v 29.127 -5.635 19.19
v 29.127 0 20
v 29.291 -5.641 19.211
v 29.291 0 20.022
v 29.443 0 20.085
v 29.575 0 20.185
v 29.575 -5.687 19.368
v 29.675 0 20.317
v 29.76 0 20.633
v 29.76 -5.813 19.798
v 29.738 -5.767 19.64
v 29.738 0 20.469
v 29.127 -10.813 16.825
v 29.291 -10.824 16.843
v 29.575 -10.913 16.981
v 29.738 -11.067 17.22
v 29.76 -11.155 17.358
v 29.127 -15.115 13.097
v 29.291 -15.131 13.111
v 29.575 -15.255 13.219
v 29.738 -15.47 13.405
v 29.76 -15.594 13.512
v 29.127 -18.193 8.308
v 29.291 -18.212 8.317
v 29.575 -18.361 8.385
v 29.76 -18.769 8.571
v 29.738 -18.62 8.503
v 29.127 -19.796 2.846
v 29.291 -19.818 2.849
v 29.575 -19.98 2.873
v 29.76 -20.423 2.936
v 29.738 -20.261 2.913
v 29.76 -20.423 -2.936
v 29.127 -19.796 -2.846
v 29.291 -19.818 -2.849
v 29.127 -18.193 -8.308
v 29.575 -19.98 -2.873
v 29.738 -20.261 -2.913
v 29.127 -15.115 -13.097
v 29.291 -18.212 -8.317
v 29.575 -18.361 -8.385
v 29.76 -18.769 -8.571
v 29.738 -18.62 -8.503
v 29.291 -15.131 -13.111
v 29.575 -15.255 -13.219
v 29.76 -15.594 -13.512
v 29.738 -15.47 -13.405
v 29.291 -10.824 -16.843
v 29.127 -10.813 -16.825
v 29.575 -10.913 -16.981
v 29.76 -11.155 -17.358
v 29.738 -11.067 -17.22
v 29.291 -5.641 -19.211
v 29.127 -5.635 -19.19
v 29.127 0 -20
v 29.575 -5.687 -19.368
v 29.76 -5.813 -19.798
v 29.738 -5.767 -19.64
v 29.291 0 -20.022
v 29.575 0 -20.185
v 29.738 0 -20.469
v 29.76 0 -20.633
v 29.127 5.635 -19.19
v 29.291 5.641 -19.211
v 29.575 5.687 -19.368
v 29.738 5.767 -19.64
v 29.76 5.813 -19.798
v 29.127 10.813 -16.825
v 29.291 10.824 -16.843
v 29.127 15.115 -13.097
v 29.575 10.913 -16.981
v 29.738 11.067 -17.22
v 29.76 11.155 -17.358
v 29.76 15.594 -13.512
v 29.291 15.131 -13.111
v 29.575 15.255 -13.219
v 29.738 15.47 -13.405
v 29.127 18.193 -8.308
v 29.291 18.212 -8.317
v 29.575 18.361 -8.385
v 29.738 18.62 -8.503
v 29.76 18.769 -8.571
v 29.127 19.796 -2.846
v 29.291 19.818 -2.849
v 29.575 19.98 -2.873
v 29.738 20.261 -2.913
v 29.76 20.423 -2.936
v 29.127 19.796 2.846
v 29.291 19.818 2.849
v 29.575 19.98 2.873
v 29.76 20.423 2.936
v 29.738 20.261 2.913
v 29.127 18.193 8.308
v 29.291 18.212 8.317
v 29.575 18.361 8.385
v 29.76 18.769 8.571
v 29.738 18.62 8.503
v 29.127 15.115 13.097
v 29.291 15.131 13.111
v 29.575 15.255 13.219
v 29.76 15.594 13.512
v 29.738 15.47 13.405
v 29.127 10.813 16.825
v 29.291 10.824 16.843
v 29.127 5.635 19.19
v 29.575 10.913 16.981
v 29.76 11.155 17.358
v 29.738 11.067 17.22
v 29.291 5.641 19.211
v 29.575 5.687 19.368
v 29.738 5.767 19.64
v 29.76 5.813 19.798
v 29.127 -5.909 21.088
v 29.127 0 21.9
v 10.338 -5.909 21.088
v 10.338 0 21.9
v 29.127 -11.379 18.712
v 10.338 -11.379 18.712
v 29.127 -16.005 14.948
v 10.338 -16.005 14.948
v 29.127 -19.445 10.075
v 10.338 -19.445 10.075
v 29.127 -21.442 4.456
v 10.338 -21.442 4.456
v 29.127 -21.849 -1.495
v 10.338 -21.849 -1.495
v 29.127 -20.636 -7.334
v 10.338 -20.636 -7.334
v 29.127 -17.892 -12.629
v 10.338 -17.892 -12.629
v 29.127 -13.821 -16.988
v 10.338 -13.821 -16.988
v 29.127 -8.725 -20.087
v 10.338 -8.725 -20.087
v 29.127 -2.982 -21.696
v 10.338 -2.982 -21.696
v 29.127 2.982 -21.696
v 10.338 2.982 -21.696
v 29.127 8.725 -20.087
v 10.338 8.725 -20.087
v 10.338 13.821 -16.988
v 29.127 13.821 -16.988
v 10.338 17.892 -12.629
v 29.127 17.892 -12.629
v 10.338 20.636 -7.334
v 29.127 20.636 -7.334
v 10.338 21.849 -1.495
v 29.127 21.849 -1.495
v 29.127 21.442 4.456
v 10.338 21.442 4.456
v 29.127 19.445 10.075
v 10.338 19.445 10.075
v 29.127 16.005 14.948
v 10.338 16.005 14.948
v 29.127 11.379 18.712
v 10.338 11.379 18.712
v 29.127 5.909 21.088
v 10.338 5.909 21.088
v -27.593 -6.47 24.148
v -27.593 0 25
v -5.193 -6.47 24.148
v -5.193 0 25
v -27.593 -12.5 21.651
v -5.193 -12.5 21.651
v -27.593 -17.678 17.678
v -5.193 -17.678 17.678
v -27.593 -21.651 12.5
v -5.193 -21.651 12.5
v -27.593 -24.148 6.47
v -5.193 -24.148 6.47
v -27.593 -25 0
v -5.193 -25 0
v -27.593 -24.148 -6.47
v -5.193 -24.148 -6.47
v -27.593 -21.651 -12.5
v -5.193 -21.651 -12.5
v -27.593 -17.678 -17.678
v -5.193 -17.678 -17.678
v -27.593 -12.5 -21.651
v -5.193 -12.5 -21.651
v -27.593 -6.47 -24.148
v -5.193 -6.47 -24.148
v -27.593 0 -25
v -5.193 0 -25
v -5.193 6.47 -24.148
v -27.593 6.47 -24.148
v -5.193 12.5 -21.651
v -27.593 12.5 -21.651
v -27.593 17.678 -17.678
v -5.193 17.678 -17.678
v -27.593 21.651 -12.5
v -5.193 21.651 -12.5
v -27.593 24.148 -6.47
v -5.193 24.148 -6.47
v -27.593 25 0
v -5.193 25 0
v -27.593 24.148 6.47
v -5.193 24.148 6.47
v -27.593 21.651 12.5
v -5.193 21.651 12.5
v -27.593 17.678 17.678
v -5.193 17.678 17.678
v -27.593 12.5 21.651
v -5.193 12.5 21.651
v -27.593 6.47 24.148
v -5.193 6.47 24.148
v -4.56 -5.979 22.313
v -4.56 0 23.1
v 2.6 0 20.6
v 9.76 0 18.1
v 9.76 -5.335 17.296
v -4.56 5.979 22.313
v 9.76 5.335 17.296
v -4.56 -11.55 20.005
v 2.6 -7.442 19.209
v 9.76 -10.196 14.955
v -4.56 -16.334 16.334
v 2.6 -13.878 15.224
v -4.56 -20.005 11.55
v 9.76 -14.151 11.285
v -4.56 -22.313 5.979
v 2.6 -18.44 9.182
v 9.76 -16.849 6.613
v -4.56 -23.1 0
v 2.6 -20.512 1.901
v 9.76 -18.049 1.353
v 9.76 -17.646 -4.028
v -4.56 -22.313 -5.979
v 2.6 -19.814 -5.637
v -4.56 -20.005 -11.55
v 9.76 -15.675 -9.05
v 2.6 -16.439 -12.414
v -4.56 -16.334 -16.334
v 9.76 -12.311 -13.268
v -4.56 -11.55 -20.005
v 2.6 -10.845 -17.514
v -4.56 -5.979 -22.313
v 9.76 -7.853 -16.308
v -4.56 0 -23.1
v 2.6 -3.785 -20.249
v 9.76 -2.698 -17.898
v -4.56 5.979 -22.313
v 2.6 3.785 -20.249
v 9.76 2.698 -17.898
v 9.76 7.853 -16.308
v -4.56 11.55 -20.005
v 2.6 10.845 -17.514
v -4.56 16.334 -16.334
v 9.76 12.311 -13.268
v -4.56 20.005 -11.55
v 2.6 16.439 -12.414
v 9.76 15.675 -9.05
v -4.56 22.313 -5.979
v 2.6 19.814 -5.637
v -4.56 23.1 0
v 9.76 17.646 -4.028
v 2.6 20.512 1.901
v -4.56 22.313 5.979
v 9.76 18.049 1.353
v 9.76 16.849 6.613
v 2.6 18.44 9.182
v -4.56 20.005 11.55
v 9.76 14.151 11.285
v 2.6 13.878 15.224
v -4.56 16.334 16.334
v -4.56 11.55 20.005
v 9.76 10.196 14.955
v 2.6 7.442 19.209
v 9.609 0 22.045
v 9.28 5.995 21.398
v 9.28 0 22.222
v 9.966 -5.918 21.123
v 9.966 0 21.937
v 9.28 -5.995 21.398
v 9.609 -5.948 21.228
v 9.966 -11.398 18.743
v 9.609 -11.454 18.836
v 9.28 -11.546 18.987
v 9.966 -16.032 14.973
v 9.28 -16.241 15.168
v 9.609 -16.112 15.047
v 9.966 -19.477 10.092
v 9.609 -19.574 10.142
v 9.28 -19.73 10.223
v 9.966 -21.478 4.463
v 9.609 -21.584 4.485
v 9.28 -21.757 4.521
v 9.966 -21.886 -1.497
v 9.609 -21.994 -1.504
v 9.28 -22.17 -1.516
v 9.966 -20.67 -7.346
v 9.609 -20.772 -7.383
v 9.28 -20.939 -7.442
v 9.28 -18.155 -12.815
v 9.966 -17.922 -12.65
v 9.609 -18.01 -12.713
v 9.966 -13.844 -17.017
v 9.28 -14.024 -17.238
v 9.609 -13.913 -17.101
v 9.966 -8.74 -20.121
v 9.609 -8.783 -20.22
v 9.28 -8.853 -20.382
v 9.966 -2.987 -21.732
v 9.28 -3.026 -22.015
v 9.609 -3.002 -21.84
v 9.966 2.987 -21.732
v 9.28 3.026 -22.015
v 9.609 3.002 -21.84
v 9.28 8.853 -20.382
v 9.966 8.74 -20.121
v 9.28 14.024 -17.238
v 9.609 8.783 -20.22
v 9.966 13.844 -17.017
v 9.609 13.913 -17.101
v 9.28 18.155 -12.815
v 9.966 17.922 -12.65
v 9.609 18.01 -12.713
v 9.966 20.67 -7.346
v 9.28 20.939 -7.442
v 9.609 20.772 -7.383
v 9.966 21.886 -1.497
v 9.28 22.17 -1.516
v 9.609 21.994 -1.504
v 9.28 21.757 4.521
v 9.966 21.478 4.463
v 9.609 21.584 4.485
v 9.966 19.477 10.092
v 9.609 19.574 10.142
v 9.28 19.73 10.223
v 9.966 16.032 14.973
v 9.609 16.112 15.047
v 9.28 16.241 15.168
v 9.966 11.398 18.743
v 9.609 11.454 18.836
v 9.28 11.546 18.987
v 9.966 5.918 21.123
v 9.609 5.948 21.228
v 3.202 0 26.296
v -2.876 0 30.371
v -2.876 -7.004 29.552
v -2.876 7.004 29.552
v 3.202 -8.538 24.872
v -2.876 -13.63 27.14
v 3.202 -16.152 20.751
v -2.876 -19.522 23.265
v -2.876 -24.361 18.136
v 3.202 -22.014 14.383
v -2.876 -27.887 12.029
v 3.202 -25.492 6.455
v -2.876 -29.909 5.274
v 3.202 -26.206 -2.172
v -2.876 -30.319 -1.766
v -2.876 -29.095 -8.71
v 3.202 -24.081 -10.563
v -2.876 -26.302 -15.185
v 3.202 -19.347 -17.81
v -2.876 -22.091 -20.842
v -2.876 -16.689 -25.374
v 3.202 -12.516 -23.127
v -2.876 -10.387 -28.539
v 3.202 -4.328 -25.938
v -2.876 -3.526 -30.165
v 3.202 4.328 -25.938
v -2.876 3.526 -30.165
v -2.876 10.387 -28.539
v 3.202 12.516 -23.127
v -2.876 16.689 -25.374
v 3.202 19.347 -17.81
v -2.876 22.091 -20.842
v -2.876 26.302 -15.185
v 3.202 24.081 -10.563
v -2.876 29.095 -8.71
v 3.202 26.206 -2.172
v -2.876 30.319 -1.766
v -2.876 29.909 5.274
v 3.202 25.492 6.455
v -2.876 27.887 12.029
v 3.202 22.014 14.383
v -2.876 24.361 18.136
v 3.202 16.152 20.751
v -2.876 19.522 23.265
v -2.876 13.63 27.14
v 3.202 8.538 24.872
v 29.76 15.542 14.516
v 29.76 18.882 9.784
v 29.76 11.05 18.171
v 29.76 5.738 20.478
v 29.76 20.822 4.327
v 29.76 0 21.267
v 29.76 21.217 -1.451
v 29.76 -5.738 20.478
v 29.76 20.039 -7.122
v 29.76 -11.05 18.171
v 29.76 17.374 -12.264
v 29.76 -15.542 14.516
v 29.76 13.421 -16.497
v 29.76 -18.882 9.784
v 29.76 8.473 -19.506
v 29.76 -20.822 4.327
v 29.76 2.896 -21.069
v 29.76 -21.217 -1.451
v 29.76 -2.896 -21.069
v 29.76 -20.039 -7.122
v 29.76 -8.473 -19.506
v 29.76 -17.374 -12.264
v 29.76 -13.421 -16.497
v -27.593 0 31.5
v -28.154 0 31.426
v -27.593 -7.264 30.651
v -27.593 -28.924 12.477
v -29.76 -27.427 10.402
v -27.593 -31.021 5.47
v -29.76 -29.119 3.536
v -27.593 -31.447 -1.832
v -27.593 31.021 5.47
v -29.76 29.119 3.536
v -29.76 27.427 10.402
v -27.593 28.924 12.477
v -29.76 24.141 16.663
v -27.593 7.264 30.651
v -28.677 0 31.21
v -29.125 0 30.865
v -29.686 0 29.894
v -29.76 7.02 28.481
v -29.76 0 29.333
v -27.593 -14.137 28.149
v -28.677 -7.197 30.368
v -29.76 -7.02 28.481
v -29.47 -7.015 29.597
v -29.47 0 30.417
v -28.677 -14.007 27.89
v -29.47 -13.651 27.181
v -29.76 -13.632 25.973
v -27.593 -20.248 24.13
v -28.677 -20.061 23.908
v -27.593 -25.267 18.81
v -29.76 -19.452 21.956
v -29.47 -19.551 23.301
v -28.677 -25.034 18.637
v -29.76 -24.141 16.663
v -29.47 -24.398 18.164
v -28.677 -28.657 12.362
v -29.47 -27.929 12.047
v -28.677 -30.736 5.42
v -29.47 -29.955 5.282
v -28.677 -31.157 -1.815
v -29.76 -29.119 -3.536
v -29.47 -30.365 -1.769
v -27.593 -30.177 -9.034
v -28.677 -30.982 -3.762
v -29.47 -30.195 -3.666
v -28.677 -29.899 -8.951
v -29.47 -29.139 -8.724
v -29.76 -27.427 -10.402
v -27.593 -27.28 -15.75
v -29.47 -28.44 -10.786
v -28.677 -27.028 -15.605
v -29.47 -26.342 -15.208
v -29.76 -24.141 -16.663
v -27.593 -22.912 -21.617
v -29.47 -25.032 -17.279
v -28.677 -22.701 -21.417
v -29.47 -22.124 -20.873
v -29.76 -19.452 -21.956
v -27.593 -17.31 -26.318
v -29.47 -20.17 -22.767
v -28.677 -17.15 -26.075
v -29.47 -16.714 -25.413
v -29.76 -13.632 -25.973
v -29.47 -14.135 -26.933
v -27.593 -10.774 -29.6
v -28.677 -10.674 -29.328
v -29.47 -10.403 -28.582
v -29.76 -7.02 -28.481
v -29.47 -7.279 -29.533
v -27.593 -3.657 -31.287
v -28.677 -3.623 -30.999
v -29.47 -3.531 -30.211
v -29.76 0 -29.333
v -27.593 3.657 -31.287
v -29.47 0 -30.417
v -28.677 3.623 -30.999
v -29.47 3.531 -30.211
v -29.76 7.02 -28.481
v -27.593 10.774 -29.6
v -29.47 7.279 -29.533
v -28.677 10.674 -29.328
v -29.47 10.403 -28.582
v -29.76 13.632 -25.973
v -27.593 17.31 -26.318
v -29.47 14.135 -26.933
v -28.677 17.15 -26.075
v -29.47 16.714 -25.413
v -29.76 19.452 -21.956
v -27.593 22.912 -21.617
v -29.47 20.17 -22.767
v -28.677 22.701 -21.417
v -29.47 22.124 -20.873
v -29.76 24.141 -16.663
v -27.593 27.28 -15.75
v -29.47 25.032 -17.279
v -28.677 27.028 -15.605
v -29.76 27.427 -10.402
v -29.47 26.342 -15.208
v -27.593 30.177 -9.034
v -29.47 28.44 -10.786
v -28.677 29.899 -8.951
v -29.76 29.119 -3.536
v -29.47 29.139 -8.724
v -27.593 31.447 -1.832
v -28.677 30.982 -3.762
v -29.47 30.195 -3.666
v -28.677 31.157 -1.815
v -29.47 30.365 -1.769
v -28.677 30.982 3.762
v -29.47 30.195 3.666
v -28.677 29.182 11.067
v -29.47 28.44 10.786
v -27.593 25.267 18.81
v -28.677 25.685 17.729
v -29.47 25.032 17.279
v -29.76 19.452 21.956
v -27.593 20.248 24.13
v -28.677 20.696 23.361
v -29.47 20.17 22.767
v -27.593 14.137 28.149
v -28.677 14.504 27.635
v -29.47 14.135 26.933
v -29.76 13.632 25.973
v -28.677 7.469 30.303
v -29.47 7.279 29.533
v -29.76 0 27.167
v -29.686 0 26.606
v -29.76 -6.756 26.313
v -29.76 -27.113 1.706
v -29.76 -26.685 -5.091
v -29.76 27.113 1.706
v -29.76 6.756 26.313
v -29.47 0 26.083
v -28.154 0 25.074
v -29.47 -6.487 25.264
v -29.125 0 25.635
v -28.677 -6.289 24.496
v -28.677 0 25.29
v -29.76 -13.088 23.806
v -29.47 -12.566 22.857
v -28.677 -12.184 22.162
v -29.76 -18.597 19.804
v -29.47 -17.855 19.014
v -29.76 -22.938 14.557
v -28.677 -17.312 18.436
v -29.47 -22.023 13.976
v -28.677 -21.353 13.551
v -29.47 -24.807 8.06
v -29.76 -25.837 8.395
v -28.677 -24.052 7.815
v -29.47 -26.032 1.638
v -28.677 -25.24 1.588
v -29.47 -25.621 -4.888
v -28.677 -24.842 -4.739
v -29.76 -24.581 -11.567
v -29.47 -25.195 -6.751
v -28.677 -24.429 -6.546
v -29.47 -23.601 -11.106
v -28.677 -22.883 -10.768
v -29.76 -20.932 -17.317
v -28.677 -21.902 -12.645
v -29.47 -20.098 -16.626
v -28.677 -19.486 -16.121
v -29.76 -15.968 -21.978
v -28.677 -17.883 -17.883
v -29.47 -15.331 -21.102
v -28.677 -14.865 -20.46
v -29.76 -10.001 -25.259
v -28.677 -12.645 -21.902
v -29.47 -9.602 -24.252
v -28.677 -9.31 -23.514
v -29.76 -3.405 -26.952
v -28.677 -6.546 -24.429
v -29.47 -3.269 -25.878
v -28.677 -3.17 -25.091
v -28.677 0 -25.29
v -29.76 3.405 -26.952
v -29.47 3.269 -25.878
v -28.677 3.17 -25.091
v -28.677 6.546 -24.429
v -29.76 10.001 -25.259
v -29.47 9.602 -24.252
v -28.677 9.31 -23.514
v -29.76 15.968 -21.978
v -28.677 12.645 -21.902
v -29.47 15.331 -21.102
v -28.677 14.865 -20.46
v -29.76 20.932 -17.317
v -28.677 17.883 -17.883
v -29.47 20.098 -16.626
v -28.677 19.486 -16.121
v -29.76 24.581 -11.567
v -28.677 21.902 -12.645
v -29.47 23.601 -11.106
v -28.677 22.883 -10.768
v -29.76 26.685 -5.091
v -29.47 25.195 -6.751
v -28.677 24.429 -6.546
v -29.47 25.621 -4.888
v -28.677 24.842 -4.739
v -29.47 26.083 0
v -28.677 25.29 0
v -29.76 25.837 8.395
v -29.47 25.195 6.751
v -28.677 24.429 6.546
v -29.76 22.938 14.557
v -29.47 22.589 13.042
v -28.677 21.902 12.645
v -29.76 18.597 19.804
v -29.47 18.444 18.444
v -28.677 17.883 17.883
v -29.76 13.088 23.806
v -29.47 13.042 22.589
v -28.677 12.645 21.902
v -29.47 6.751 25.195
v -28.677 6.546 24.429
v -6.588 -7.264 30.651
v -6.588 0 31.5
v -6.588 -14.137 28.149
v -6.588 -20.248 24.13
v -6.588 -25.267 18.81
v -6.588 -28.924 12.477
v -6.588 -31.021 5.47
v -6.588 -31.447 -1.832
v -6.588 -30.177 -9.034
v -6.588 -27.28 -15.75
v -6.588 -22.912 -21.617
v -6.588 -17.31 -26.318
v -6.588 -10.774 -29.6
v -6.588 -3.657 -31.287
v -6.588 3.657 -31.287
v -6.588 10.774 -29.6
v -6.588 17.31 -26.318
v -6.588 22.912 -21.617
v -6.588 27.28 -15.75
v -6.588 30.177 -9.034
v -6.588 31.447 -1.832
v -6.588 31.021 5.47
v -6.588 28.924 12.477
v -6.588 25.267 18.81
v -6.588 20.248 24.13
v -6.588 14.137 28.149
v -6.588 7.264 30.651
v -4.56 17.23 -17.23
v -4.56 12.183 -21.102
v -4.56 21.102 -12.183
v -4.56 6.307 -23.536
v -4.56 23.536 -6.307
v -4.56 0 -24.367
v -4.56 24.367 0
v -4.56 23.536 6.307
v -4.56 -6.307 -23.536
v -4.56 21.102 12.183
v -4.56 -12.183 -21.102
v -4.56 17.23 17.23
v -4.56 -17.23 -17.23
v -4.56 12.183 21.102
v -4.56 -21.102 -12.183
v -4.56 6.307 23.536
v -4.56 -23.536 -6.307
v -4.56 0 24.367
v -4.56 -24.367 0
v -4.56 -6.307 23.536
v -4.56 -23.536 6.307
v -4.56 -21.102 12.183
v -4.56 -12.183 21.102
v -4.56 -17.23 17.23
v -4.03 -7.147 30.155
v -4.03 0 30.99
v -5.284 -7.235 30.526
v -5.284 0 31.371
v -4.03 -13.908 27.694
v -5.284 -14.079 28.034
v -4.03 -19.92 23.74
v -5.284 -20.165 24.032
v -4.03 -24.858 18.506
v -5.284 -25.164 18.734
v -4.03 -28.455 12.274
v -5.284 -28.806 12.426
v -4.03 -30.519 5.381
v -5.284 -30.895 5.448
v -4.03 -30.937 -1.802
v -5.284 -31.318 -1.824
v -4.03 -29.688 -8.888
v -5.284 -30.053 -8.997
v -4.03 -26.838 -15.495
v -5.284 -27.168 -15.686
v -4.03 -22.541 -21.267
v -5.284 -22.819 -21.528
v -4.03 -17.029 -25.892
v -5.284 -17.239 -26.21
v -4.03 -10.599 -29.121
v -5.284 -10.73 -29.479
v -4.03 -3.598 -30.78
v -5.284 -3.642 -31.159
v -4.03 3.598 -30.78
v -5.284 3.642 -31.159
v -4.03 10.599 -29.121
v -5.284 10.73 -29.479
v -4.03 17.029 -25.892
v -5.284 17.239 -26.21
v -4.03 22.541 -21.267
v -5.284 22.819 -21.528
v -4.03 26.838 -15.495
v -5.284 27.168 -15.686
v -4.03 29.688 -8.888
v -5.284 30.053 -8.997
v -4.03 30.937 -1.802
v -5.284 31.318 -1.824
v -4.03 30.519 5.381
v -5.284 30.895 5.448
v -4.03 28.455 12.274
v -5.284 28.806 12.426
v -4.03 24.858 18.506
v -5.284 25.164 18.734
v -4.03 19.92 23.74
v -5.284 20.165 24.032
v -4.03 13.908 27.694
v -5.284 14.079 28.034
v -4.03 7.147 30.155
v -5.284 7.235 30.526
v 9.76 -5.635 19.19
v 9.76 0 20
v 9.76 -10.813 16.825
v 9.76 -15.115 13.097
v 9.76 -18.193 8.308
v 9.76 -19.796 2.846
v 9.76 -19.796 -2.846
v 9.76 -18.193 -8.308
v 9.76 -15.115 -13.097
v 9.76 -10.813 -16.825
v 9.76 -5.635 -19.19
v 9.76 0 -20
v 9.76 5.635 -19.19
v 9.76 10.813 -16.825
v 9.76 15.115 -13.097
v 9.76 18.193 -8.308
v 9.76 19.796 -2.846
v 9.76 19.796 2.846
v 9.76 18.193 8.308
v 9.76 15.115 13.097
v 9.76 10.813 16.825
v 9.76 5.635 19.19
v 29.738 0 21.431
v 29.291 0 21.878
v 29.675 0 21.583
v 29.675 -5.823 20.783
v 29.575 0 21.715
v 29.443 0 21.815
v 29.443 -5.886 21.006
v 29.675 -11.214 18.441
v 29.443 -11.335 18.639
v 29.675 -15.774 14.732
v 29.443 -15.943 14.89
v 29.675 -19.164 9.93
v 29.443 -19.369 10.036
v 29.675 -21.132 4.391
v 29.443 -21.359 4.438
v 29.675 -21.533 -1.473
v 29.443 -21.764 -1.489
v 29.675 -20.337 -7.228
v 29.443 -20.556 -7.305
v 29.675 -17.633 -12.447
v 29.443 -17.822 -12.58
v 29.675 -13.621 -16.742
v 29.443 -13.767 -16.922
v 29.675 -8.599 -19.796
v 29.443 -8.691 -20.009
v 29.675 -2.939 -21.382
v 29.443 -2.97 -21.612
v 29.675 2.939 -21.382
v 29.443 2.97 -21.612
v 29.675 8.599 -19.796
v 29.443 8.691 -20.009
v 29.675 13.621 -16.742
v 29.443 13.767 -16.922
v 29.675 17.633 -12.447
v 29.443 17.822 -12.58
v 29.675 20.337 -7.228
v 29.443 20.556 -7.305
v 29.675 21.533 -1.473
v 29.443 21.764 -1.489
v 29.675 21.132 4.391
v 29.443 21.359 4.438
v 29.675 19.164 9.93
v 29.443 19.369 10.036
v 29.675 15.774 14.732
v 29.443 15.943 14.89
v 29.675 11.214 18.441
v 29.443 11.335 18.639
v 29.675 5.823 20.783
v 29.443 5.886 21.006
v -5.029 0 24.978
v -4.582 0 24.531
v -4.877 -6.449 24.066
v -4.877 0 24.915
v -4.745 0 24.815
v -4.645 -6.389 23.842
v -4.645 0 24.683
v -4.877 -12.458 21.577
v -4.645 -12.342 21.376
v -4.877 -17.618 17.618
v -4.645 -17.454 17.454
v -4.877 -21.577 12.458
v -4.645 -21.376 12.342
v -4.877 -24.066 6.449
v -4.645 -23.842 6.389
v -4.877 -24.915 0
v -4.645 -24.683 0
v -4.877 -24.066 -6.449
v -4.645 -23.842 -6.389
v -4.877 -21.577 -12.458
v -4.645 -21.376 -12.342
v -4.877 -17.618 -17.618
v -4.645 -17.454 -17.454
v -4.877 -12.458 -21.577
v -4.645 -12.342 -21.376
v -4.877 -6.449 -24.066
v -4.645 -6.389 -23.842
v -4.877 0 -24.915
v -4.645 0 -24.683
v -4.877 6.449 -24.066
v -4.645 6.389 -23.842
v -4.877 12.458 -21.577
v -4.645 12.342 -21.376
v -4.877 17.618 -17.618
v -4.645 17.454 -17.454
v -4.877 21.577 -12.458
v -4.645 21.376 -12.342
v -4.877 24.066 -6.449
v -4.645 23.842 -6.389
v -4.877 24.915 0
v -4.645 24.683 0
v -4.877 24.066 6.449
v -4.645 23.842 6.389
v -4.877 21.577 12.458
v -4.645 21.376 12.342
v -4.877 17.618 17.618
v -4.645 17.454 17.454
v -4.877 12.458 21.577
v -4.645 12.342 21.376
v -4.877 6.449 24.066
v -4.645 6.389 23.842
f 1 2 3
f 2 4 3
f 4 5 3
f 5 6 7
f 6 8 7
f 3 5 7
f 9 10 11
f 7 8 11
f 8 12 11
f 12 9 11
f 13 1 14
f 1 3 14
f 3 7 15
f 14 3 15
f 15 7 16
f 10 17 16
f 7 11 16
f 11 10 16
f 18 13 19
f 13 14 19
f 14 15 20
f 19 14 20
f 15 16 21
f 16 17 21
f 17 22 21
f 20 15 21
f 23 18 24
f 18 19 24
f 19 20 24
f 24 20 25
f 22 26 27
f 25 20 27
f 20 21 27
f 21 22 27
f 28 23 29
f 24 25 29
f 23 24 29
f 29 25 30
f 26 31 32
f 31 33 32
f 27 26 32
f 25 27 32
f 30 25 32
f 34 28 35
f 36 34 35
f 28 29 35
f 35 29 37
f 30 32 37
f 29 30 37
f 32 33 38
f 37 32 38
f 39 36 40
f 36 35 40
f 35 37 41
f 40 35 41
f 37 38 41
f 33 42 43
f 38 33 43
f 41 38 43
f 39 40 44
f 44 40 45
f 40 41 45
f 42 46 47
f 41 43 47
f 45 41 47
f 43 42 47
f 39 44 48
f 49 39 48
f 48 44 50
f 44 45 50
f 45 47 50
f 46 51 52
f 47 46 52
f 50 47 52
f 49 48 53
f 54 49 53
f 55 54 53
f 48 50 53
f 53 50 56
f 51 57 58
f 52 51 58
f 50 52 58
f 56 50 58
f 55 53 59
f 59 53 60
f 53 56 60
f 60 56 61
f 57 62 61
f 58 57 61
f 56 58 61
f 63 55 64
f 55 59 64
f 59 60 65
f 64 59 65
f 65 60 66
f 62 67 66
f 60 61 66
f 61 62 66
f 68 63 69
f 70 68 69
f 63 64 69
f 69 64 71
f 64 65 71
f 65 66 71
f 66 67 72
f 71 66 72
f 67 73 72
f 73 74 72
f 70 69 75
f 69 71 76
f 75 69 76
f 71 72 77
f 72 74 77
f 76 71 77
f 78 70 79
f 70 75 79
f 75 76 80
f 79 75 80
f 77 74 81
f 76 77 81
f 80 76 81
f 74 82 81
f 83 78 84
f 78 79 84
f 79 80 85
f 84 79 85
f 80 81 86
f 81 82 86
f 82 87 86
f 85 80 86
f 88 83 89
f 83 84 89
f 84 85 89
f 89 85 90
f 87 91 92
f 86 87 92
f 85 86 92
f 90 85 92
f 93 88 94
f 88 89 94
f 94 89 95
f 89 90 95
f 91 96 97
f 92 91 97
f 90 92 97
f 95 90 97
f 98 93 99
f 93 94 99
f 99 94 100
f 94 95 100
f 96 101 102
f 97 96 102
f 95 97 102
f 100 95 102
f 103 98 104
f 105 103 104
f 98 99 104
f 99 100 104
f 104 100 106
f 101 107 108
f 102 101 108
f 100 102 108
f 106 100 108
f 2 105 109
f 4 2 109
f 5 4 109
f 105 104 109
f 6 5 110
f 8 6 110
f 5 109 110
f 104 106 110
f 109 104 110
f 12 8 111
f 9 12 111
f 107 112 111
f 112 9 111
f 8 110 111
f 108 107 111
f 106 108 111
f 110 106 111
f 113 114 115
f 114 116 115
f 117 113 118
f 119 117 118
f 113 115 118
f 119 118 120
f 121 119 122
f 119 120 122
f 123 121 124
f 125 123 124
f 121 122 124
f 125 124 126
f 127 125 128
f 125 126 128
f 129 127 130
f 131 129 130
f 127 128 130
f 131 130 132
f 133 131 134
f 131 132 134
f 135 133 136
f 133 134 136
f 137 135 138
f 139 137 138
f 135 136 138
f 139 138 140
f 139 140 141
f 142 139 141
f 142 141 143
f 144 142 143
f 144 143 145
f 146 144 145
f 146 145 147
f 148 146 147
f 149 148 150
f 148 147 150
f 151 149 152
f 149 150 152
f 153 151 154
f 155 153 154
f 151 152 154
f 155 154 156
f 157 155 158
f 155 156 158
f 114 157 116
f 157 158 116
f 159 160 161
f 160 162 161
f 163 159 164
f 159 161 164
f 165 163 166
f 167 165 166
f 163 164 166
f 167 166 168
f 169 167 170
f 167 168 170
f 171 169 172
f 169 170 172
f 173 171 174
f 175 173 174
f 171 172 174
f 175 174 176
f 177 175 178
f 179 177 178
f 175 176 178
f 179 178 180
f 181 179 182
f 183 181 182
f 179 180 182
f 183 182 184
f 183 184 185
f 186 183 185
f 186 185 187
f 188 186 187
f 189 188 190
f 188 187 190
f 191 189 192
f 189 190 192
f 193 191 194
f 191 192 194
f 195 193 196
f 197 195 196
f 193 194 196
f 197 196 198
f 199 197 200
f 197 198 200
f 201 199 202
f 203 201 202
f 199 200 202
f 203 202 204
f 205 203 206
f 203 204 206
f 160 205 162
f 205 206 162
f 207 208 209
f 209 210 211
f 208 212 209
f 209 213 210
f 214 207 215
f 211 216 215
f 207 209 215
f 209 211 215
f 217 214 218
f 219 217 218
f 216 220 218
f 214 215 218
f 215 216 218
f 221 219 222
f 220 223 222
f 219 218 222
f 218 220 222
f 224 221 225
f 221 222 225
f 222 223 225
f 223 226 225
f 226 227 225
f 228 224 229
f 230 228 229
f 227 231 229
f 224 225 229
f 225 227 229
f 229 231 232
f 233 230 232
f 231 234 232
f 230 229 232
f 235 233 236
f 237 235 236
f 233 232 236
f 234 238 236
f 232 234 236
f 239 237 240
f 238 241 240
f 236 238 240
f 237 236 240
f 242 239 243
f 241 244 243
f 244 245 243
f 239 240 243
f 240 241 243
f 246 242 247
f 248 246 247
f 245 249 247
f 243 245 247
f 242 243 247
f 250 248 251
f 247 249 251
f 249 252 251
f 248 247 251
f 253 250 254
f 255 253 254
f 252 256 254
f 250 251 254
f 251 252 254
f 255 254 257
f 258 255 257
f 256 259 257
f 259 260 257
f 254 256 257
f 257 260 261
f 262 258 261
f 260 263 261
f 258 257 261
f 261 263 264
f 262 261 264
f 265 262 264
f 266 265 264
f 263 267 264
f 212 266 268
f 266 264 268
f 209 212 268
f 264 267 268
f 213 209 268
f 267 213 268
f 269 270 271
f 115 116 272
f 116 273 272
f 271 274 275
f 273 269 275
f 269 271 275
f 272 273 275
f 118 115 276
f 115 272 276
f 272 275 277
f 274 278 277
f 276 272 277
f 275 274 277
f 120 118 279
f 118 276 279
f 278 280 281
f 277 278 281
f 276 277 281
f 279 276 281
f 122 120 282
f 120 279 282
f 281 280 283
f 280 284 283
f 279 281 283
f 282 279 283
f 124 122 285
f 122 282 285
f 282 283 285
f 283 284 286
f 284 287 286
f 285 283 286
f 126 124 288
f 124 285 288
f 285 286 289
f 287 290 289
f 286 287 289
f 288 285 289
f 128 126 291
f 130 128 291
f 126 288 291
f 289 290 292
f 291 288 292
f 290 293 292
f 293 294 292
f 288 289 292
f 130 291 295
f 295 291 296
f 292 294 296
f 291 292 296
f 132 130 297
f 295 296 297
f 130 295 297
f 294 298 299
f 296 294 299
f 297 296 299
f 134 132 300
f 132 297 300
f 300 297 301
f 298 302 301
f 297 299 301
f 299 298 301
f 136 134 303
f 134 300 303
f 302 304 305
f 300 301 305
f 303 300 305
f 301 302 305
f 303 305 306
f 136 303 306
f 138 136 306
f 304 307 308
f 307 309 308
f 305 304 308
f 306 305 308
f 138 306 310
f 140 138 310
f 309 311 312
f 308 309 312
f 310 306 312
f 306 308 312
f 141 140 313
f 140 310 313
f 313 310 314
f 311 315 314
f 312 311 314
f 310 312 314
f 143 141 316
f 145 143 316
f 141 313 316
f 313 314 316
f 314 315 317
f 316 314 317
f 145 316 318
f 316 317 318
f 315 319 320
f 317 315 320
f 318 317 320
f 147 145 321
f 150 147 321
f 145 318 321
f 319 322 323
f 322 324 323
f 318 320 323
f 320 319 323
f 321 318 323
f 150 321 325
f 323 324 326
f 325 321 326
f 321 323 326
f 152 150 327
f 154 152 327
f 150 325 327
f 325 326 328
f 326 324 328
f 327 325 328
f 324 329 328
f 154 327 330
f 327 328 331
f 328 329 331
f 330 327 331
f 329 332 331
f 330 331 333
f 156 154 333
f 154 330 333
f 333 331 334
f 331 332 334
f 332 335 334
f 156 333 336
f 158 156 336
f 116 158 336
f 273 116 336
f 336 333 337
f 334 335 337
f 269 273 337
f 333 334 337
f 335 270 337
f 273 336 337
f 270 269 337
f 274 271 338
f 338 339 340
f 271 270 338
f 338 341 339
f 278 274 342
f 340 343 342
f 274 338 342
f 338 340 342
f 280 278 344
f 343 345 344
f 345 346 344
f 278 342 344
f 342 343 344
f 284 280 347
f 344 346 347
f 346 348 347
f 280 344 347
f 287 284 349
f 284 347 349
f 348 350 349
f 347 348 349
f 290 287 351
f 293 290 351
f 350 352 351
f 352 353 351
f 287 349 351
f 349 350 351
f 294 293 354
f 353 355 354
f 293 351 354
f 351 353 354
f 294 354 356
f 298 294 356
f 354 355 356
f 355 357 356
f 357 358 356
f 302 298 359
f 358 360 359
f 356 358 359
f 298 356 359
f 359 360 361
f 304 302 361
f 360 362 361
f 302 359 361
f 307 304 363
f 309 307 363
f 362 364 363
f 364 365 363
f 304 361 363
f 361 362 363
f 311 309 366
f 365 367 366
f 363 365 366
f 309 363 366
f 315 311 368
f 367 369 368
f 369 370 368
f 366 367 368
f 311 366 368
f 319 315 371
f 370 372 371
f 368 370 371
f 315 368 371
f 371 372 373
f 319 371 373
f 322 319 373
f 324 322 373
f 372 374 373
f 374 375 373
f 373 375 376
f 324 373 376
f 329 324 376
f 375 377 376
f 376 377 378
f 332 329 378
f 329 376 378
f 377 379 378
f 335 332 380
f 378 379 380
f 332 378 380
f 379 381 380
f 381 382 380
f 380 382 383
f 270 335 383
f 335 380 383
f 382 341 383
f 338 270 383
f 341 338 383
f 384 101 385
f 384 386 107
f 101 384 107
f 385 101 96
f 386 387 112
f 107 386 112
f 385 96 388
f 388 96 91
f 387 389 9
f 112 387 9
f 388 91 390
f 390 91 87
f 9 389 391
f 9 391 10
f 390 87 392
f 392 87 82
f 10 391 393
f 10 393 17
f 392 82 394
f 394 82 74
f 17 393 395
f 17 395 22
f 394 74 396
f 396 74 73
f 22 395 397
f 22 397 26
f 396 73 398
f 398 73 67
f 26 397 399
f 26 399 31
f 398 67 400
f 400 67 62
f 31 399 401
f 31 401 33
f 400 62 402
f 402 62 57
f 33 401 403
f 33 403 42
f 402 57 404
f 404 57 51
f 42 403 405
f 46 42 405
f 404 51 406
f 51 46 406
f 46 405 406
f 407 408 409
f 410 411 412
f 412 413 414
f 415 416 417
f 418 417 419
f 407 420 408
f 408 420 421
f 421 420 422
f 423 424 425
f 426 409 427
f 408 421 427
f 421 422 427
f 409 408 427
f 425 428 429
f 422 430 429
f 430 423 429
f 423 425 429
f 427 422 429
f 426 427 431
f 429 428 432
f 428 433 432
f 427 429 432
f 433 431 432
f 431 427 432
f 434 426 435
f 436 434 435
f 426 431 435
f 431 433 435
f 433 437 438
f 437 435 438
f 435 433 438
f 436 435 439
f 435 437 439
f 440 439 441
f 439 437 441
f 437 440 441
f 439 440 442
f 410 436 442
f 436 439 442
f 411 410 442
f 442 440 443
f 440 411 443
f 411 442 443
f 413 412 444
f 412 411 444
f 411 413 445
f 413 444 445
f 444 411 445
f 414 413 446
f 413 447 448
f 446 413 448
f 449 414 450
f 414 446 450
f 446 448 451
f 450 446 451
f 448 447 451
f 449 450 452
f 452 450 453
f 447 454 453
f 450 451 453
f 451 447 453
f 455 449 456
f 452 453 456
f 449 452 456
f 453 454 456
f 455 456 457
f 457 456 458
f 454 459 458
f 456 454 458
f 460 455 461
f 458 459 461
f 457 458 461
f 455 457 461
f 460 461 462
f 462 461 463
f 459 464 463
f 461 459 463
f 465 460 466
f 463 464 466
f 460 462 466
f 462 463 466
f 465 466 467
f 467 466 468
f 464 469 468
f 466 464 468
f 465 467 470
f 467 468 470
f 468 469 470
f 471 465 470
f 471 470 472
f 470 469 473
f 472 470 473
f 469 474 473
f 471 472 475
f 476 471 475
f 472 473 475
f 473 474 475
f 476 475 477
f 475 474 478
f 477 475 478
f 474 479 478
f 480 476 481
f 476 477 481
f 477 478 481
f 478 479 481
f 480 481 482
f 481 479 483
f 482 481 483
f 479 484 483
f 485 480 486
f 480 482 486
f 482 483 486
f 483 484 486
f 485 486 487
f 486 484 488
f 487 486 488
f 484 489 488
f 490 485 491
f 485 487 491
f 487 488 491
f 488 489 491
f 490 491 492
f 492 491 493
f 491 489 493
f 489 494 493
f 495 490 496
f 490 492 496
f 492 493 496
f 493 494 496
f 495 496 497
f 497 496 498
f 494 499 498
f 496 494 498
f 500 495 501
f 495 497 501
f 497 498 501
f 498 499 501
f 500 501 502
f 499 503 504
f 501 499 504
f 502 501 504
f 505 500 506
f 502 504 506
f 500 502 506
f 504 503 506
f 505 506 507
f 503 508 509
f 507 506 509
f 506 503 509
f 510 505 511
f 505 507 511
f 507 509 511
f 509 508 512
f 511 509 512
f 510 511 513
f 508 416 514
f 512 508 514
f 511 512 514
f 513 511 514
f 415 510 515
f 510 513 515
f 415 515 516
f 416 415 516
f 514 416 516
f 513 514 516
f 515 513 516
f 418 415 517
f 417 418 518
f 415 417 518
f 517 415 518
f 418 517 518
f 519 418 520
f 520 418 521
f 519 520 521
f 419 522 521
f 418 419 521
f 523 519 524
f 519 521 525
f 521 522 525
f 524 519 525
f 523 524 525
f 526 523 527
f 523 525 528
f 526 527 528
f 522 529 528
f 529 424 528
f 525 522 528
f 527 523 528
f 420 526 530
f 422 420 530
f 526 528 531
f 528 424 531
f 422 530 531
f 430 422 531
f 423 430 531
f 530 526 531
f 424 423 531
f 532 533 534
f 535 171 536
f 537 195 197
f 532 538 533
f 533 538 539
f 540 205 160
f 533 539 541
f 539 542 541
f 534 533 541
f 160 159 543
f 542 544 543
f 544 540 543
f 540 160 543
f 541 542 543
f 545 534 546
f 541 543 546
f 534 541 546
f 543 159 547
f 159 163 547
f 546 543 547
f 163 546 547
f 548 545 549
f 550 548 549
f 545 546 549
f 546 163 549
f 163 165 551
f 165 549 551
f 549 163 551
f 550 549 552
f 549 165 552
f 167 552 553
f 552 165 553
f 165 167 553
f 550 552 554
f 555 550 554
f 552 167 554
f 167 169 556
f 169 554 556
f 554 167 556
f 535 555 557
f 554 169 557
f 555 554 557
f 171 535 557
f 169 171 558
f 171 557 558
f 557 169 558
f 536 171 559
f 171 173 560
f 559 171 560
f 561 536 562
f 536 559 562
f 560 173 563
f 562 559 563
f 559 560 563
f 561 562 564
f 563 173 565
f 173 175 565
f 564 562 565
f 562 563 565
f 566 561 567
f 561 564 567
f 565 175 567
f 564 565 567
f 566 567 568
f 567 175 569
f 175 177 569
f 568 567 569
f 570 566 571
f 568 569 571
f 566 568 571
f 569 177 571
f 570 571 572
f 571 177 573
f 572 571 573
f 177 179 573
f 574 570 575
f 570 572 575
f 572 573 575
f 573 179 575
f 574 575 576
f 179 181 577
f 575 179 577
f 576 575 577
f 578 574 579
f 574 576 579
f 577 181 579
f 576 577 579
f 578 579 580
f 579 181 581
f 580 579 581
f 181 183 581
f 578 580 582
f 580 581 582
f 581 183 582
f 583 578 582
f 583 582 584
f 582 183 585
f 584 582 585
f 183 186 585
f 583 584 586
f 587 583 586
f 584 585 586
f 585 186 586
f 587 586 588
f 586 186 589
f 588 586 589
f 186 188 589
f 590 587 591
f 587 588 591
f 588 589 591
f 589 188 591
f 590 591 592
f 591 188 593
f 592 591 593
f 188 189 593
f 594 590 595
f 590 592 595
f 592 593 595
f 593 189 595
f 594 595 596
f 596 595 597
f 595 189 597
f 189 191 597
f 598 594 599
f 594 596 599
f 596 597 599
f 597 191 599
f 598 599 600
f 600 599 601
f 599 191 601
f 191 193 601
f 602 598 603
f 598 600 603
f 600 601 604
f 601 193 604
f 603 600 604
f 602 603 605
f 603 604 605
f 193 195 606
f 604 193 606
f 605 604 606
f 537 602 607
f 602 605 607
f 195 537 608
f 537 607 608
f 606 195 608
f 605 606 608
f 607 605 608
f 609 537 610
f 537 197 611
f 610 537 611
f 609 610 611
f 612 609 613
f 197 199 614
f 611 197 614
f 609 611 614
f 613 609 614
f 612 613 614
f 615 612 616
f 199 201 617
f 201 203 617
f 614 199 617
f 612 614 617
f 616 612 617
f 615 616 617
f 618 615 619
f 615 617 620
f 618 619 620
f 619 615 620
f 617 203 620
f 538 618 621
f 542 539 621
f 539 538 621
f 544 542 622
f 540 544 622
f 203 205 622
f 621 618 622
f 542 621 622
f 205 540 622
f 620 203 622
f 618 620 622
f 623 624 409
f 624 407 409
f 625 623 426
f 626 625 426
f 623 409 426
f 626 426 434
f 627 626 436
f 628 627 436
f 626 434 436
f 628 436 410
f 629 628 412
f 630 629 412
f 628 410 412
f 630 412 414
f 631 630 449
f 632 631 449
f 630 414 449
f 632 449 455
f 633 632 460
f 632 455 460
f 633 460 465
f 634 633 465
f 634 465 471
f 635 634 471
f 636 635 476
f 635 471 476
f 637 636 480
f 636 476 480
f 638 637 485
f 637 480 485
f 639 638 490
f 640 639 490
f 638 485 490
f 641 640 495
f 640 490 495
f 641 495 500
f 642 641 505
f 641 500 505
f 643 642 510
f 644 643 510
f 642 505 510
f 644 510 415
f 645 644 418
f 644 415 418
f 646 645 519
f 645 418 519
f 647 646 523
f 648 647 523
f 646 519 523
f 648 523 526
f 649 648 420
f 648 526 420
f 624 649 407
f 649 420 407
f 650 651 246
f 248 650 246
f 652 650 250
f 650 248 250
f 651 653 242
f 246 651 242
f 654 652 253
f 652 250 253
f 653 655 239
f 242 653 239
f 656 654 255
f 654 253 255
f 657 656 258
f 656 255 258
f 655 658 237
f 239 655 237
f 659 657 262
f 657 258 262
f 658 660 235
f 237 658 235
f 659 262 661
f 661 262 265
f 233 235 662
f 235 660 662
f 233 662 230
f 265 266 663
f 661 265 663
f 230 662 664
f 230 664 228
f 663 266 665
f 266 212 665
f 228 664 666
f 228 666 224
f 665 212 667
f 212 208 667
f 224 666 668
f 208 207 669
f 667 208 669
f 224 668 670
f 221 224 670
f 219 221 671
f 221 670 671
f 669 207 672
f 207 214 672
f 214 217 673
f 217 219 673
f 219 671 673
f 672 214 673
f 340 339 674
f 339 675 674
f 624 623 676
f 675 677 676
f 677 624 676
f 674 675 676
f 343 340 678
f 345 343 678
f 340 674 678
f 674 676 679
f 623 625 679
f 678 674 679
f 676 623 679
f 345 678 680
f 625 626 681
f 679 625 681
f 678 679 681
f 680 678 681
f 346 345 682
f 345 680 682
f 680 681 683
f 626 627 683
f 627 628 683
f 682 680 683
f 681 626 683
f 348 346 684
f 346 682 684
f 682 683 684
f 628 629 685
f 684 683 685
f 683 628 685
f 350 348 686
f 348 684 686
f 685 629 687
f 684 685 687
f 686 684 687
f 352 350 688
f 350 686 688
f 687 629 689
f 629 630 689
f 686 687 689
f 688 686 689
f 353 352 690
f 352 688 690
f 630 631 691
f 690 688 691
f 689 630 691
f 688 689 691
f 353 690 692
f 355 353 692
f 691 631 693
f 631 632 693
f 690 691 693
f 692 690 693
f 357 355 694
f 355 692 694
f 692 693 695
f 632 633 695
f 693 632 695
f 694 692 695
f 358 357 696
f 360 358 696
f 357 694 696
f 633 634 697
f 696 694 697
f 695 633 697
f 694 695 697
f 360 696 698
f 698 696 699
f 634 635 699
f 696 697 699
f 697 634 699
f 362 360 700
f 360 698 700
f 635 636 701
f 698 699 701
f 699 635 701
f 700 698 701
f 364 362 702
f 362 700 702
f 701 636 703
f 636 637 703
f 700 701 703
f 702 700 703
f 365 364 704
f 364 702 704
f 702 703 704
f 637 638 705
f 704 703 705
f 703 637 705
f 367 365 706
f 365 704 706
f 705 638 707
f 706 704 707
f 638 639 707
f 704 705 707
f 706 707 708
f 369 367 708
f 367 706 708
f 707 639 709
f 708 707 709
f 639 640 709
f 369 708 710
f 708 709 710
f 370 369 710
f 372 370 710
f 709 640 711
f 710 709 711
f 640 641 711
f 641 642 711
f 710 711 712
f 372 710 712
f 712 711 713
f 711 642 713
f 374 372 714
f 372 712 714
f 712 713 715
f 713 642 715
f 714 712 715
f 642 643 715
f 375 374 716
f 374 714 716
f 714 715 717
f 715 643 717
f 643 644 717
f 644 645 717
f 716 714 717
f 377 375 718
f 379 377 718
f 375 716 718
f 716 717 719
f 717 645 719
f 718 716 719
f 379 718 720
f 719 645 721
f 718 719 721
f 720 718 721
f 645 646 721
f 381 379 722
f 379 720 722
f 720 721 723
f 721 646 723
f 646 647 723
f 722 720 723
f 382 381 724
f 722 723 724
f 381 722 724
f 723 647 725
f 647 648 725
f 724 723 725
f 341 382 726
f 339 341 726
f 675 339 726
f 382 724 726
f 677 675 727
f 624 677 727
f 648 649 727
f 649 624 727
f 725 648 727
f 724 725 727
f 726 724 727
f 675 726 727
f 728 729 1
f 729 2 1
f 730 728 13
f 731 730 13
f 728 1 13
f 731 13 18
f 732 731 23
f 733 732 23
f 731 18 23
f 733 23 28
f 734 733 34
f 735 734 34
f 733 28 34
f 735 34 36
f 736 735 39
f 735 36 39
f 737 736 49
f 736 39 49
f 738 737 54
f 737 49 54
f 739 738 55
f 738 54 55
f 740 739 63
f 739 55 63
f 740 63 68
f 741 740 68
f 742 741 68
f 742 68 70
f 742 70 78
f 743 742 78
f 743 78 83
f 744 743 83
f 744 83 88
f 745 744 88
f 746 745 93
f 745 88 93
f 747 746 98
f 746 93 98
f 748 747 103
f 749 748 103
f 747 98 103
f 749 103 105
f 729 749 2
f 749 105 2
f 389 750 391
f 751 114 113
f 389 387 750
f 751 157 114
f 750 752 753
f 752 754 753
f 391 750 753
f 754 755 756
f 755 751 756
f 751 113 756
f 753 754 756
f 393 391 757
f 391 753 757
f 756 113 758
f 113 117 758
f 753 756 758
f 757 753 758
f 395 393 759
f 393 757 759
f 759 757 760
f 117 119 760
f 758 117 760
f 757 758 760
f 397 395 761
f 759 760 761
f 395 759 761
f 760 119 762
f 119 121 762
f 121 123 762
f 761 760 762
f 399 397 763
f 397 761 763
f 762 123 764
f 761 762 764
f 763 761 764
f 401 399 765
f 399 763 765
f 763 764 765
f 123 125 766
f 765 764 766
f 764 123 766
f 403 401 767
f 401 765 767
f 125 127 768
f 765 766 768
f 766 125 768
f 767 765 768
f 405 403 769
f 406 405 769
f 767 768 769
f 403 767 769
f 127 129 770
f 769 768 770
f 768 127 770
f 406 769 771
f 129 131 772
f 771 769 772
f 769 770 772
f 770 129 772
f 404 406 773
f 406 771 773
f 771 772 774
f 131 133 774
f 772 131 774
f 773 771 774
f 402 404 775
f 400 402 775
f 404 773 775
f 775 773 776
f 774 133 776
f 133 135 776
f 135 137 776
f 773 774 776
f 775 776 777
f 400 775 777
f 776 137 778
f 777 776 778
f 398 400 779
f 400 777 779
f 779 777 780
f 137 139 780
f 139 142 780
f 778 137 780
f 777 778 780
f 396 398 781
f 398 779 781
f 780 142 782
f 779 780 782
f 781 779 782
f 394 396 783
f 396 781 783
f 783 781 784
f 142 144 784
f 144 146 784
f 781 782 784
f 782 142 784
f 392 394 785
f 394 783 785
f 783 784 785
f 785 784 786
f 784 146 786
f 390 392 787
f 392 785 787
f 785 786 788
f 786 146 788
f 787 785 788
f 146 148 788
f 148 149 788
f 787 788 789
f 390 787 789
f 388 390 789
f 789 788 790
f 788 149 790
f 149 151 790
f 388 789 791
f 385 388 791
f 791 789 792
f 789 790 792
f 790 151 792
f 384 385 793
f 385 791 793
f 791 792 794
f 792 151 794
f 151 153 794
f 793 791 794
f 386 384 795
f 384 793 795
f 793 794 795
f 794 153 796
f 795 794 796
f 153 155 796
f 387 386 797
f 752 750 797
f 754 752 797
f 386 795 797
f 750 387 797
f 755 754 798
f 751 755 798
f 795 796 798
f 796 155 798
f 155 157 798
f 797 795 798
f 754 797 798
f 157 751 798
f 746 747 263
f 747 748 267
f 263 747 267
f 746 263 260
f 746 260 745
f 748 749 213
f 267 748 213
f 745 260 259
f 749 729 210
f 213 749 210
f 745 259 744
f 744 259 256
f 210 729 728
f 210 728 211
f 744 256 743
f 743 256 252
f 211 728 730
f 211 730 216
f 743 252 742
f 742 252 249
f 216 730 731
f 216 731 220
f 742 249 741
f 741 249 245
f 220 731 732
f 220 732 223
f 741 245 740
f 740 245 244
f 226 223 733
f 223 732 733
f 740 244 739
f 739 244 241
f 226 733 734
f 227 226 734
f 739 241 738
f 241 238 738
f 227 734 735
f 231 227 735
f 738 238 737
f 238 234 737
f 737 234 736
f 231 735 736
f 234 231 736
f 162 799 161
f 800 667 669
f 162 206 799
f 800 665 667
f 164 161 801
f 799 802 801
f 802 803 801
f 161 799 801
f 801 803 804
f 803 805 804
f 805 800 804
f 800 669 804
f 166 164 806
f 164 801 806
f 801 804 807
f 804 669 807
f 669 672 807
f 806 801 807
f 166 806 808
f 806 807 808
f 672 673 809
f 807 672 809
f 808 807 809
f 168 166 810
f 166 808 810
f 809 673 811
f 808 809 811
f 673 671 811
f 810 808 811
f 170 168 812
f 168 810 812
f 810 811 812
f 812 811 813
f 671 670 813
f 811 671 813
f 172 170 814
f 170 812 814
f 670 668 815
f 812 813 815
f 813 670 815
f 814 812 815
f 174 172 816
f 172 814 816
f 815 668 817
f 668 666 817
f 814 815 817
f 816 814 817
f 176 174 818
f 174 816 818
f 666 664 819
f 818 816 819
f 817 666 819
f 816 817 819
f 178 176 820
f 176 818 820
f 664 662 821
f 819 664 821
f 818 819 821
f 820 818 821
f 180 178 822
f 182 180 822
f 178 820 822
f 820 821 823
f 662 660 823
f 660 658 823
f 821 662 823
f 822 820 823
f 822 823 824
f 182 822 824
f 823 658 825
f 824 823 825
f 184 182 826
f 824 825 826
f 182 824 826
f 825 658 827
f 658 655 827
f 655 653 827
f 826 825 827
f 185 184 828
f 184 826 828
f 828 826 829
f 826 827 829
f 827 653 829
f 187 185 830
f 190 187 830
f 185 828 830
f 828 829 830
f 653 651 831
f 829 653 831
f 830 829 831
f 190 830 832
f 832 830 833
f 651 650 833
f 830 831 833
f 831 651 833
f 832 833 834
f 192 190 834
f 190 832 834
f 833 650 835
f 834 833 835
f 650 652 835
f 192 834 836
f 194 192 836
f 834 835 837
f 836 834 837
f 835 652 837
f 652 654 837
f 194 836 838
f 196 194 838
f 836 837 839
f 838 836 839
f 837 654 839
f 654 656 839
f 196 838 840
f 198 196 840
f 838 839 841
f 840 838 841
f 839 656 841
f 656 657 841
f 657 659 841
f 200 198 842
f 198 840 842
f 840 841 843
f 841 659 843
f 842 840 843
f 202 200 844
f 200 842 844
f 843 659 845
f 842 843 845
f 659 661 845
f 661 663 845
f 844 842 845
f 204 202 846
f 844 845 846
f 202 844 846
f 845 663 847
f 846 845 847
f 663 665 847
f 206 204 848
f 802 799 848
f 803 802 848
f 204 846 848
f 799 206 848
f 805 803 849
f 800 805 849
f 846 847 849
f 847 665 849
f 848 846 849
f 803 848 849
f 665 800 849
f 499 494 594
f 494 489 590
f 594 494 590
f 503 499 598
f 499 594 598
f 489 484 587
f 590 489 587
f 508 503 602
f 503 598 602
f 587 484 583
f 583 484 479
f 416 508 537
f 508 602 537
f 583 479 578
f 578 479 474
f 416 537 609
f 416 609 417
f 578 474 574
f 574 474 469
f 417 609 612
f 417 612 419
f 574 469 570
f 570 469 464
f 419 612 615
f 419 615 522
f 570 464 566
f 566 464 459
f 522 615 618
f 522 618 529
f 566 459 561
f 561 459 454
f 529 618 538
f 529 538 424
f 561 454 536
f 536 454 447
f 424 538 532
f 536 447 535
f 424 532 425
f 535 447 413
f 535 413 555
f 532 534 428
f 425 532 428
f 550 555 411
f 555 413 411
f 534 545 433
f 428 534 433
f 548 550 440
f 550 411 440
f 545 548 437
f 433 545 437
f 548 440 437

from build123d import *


with BuildPart() as part:
    # Эскиз1 → Повернуть1 (revolve)
    with BuildSketch(Plane.XY):
        with BuildLine():
            Line((-29.76, 29.333333333), (-29.76, 27.166666667))
            ThreePointArc((-29.76, 27.166666667), (-29.125398026, 25.634601974), (-27.593333333, 25))
            Line((-27.593333333, 25), (-5.193333333, 25))
            ThreePointArc((-5.193333333, 25), (-4.745499039, 24.814500961), (-4.56, 24.366666667))
            Line((-4.56, 24.366666667), (-4.56, 23.1))
            Line((-4.56, 23.1), (9.76, 18.1))
            Line((9.76, 18.1), (9.76, 20))
            Line((9.76, 20), (29.126666667, 20))
            ThreePointArc((29.126666667, 20), (29.574500961, 20.185499039), (29.76, 20.633333333))
            Line((29.76, 20.633333333), (29.76, 21.266666667))
            ThreePointArc((29.76, 21.266666667), (29.574500961, 21.714500961), (29.126666667, 21.9))
            Line((29.126666667, 21.9), (10.337944219, 21.9))
            ThreePointArc((10.337944219, 21.9), (9.785014419, 21.982235264), (9.279948122, 22.221822488))
            Line((9.279948122, 22.221822488), (-2.875607444, 30.370798287))
            ThreePointArc((-2.875607444, 30.370798287), (-4.64776989, 31.211455215), (-6.587874452, 31.5))
            Line((-6.587874452, 31.5), (-27.593333333, 31.5))
            ThreePointArc((-27.593333333, 31.5), (-29.125398026, 30.865398026), (-29.76, 29.333333333))
        make_face()
    revolve(axis=Axis((-29.76, 0, 0), (1, 0, 0)))


solid = part.part
